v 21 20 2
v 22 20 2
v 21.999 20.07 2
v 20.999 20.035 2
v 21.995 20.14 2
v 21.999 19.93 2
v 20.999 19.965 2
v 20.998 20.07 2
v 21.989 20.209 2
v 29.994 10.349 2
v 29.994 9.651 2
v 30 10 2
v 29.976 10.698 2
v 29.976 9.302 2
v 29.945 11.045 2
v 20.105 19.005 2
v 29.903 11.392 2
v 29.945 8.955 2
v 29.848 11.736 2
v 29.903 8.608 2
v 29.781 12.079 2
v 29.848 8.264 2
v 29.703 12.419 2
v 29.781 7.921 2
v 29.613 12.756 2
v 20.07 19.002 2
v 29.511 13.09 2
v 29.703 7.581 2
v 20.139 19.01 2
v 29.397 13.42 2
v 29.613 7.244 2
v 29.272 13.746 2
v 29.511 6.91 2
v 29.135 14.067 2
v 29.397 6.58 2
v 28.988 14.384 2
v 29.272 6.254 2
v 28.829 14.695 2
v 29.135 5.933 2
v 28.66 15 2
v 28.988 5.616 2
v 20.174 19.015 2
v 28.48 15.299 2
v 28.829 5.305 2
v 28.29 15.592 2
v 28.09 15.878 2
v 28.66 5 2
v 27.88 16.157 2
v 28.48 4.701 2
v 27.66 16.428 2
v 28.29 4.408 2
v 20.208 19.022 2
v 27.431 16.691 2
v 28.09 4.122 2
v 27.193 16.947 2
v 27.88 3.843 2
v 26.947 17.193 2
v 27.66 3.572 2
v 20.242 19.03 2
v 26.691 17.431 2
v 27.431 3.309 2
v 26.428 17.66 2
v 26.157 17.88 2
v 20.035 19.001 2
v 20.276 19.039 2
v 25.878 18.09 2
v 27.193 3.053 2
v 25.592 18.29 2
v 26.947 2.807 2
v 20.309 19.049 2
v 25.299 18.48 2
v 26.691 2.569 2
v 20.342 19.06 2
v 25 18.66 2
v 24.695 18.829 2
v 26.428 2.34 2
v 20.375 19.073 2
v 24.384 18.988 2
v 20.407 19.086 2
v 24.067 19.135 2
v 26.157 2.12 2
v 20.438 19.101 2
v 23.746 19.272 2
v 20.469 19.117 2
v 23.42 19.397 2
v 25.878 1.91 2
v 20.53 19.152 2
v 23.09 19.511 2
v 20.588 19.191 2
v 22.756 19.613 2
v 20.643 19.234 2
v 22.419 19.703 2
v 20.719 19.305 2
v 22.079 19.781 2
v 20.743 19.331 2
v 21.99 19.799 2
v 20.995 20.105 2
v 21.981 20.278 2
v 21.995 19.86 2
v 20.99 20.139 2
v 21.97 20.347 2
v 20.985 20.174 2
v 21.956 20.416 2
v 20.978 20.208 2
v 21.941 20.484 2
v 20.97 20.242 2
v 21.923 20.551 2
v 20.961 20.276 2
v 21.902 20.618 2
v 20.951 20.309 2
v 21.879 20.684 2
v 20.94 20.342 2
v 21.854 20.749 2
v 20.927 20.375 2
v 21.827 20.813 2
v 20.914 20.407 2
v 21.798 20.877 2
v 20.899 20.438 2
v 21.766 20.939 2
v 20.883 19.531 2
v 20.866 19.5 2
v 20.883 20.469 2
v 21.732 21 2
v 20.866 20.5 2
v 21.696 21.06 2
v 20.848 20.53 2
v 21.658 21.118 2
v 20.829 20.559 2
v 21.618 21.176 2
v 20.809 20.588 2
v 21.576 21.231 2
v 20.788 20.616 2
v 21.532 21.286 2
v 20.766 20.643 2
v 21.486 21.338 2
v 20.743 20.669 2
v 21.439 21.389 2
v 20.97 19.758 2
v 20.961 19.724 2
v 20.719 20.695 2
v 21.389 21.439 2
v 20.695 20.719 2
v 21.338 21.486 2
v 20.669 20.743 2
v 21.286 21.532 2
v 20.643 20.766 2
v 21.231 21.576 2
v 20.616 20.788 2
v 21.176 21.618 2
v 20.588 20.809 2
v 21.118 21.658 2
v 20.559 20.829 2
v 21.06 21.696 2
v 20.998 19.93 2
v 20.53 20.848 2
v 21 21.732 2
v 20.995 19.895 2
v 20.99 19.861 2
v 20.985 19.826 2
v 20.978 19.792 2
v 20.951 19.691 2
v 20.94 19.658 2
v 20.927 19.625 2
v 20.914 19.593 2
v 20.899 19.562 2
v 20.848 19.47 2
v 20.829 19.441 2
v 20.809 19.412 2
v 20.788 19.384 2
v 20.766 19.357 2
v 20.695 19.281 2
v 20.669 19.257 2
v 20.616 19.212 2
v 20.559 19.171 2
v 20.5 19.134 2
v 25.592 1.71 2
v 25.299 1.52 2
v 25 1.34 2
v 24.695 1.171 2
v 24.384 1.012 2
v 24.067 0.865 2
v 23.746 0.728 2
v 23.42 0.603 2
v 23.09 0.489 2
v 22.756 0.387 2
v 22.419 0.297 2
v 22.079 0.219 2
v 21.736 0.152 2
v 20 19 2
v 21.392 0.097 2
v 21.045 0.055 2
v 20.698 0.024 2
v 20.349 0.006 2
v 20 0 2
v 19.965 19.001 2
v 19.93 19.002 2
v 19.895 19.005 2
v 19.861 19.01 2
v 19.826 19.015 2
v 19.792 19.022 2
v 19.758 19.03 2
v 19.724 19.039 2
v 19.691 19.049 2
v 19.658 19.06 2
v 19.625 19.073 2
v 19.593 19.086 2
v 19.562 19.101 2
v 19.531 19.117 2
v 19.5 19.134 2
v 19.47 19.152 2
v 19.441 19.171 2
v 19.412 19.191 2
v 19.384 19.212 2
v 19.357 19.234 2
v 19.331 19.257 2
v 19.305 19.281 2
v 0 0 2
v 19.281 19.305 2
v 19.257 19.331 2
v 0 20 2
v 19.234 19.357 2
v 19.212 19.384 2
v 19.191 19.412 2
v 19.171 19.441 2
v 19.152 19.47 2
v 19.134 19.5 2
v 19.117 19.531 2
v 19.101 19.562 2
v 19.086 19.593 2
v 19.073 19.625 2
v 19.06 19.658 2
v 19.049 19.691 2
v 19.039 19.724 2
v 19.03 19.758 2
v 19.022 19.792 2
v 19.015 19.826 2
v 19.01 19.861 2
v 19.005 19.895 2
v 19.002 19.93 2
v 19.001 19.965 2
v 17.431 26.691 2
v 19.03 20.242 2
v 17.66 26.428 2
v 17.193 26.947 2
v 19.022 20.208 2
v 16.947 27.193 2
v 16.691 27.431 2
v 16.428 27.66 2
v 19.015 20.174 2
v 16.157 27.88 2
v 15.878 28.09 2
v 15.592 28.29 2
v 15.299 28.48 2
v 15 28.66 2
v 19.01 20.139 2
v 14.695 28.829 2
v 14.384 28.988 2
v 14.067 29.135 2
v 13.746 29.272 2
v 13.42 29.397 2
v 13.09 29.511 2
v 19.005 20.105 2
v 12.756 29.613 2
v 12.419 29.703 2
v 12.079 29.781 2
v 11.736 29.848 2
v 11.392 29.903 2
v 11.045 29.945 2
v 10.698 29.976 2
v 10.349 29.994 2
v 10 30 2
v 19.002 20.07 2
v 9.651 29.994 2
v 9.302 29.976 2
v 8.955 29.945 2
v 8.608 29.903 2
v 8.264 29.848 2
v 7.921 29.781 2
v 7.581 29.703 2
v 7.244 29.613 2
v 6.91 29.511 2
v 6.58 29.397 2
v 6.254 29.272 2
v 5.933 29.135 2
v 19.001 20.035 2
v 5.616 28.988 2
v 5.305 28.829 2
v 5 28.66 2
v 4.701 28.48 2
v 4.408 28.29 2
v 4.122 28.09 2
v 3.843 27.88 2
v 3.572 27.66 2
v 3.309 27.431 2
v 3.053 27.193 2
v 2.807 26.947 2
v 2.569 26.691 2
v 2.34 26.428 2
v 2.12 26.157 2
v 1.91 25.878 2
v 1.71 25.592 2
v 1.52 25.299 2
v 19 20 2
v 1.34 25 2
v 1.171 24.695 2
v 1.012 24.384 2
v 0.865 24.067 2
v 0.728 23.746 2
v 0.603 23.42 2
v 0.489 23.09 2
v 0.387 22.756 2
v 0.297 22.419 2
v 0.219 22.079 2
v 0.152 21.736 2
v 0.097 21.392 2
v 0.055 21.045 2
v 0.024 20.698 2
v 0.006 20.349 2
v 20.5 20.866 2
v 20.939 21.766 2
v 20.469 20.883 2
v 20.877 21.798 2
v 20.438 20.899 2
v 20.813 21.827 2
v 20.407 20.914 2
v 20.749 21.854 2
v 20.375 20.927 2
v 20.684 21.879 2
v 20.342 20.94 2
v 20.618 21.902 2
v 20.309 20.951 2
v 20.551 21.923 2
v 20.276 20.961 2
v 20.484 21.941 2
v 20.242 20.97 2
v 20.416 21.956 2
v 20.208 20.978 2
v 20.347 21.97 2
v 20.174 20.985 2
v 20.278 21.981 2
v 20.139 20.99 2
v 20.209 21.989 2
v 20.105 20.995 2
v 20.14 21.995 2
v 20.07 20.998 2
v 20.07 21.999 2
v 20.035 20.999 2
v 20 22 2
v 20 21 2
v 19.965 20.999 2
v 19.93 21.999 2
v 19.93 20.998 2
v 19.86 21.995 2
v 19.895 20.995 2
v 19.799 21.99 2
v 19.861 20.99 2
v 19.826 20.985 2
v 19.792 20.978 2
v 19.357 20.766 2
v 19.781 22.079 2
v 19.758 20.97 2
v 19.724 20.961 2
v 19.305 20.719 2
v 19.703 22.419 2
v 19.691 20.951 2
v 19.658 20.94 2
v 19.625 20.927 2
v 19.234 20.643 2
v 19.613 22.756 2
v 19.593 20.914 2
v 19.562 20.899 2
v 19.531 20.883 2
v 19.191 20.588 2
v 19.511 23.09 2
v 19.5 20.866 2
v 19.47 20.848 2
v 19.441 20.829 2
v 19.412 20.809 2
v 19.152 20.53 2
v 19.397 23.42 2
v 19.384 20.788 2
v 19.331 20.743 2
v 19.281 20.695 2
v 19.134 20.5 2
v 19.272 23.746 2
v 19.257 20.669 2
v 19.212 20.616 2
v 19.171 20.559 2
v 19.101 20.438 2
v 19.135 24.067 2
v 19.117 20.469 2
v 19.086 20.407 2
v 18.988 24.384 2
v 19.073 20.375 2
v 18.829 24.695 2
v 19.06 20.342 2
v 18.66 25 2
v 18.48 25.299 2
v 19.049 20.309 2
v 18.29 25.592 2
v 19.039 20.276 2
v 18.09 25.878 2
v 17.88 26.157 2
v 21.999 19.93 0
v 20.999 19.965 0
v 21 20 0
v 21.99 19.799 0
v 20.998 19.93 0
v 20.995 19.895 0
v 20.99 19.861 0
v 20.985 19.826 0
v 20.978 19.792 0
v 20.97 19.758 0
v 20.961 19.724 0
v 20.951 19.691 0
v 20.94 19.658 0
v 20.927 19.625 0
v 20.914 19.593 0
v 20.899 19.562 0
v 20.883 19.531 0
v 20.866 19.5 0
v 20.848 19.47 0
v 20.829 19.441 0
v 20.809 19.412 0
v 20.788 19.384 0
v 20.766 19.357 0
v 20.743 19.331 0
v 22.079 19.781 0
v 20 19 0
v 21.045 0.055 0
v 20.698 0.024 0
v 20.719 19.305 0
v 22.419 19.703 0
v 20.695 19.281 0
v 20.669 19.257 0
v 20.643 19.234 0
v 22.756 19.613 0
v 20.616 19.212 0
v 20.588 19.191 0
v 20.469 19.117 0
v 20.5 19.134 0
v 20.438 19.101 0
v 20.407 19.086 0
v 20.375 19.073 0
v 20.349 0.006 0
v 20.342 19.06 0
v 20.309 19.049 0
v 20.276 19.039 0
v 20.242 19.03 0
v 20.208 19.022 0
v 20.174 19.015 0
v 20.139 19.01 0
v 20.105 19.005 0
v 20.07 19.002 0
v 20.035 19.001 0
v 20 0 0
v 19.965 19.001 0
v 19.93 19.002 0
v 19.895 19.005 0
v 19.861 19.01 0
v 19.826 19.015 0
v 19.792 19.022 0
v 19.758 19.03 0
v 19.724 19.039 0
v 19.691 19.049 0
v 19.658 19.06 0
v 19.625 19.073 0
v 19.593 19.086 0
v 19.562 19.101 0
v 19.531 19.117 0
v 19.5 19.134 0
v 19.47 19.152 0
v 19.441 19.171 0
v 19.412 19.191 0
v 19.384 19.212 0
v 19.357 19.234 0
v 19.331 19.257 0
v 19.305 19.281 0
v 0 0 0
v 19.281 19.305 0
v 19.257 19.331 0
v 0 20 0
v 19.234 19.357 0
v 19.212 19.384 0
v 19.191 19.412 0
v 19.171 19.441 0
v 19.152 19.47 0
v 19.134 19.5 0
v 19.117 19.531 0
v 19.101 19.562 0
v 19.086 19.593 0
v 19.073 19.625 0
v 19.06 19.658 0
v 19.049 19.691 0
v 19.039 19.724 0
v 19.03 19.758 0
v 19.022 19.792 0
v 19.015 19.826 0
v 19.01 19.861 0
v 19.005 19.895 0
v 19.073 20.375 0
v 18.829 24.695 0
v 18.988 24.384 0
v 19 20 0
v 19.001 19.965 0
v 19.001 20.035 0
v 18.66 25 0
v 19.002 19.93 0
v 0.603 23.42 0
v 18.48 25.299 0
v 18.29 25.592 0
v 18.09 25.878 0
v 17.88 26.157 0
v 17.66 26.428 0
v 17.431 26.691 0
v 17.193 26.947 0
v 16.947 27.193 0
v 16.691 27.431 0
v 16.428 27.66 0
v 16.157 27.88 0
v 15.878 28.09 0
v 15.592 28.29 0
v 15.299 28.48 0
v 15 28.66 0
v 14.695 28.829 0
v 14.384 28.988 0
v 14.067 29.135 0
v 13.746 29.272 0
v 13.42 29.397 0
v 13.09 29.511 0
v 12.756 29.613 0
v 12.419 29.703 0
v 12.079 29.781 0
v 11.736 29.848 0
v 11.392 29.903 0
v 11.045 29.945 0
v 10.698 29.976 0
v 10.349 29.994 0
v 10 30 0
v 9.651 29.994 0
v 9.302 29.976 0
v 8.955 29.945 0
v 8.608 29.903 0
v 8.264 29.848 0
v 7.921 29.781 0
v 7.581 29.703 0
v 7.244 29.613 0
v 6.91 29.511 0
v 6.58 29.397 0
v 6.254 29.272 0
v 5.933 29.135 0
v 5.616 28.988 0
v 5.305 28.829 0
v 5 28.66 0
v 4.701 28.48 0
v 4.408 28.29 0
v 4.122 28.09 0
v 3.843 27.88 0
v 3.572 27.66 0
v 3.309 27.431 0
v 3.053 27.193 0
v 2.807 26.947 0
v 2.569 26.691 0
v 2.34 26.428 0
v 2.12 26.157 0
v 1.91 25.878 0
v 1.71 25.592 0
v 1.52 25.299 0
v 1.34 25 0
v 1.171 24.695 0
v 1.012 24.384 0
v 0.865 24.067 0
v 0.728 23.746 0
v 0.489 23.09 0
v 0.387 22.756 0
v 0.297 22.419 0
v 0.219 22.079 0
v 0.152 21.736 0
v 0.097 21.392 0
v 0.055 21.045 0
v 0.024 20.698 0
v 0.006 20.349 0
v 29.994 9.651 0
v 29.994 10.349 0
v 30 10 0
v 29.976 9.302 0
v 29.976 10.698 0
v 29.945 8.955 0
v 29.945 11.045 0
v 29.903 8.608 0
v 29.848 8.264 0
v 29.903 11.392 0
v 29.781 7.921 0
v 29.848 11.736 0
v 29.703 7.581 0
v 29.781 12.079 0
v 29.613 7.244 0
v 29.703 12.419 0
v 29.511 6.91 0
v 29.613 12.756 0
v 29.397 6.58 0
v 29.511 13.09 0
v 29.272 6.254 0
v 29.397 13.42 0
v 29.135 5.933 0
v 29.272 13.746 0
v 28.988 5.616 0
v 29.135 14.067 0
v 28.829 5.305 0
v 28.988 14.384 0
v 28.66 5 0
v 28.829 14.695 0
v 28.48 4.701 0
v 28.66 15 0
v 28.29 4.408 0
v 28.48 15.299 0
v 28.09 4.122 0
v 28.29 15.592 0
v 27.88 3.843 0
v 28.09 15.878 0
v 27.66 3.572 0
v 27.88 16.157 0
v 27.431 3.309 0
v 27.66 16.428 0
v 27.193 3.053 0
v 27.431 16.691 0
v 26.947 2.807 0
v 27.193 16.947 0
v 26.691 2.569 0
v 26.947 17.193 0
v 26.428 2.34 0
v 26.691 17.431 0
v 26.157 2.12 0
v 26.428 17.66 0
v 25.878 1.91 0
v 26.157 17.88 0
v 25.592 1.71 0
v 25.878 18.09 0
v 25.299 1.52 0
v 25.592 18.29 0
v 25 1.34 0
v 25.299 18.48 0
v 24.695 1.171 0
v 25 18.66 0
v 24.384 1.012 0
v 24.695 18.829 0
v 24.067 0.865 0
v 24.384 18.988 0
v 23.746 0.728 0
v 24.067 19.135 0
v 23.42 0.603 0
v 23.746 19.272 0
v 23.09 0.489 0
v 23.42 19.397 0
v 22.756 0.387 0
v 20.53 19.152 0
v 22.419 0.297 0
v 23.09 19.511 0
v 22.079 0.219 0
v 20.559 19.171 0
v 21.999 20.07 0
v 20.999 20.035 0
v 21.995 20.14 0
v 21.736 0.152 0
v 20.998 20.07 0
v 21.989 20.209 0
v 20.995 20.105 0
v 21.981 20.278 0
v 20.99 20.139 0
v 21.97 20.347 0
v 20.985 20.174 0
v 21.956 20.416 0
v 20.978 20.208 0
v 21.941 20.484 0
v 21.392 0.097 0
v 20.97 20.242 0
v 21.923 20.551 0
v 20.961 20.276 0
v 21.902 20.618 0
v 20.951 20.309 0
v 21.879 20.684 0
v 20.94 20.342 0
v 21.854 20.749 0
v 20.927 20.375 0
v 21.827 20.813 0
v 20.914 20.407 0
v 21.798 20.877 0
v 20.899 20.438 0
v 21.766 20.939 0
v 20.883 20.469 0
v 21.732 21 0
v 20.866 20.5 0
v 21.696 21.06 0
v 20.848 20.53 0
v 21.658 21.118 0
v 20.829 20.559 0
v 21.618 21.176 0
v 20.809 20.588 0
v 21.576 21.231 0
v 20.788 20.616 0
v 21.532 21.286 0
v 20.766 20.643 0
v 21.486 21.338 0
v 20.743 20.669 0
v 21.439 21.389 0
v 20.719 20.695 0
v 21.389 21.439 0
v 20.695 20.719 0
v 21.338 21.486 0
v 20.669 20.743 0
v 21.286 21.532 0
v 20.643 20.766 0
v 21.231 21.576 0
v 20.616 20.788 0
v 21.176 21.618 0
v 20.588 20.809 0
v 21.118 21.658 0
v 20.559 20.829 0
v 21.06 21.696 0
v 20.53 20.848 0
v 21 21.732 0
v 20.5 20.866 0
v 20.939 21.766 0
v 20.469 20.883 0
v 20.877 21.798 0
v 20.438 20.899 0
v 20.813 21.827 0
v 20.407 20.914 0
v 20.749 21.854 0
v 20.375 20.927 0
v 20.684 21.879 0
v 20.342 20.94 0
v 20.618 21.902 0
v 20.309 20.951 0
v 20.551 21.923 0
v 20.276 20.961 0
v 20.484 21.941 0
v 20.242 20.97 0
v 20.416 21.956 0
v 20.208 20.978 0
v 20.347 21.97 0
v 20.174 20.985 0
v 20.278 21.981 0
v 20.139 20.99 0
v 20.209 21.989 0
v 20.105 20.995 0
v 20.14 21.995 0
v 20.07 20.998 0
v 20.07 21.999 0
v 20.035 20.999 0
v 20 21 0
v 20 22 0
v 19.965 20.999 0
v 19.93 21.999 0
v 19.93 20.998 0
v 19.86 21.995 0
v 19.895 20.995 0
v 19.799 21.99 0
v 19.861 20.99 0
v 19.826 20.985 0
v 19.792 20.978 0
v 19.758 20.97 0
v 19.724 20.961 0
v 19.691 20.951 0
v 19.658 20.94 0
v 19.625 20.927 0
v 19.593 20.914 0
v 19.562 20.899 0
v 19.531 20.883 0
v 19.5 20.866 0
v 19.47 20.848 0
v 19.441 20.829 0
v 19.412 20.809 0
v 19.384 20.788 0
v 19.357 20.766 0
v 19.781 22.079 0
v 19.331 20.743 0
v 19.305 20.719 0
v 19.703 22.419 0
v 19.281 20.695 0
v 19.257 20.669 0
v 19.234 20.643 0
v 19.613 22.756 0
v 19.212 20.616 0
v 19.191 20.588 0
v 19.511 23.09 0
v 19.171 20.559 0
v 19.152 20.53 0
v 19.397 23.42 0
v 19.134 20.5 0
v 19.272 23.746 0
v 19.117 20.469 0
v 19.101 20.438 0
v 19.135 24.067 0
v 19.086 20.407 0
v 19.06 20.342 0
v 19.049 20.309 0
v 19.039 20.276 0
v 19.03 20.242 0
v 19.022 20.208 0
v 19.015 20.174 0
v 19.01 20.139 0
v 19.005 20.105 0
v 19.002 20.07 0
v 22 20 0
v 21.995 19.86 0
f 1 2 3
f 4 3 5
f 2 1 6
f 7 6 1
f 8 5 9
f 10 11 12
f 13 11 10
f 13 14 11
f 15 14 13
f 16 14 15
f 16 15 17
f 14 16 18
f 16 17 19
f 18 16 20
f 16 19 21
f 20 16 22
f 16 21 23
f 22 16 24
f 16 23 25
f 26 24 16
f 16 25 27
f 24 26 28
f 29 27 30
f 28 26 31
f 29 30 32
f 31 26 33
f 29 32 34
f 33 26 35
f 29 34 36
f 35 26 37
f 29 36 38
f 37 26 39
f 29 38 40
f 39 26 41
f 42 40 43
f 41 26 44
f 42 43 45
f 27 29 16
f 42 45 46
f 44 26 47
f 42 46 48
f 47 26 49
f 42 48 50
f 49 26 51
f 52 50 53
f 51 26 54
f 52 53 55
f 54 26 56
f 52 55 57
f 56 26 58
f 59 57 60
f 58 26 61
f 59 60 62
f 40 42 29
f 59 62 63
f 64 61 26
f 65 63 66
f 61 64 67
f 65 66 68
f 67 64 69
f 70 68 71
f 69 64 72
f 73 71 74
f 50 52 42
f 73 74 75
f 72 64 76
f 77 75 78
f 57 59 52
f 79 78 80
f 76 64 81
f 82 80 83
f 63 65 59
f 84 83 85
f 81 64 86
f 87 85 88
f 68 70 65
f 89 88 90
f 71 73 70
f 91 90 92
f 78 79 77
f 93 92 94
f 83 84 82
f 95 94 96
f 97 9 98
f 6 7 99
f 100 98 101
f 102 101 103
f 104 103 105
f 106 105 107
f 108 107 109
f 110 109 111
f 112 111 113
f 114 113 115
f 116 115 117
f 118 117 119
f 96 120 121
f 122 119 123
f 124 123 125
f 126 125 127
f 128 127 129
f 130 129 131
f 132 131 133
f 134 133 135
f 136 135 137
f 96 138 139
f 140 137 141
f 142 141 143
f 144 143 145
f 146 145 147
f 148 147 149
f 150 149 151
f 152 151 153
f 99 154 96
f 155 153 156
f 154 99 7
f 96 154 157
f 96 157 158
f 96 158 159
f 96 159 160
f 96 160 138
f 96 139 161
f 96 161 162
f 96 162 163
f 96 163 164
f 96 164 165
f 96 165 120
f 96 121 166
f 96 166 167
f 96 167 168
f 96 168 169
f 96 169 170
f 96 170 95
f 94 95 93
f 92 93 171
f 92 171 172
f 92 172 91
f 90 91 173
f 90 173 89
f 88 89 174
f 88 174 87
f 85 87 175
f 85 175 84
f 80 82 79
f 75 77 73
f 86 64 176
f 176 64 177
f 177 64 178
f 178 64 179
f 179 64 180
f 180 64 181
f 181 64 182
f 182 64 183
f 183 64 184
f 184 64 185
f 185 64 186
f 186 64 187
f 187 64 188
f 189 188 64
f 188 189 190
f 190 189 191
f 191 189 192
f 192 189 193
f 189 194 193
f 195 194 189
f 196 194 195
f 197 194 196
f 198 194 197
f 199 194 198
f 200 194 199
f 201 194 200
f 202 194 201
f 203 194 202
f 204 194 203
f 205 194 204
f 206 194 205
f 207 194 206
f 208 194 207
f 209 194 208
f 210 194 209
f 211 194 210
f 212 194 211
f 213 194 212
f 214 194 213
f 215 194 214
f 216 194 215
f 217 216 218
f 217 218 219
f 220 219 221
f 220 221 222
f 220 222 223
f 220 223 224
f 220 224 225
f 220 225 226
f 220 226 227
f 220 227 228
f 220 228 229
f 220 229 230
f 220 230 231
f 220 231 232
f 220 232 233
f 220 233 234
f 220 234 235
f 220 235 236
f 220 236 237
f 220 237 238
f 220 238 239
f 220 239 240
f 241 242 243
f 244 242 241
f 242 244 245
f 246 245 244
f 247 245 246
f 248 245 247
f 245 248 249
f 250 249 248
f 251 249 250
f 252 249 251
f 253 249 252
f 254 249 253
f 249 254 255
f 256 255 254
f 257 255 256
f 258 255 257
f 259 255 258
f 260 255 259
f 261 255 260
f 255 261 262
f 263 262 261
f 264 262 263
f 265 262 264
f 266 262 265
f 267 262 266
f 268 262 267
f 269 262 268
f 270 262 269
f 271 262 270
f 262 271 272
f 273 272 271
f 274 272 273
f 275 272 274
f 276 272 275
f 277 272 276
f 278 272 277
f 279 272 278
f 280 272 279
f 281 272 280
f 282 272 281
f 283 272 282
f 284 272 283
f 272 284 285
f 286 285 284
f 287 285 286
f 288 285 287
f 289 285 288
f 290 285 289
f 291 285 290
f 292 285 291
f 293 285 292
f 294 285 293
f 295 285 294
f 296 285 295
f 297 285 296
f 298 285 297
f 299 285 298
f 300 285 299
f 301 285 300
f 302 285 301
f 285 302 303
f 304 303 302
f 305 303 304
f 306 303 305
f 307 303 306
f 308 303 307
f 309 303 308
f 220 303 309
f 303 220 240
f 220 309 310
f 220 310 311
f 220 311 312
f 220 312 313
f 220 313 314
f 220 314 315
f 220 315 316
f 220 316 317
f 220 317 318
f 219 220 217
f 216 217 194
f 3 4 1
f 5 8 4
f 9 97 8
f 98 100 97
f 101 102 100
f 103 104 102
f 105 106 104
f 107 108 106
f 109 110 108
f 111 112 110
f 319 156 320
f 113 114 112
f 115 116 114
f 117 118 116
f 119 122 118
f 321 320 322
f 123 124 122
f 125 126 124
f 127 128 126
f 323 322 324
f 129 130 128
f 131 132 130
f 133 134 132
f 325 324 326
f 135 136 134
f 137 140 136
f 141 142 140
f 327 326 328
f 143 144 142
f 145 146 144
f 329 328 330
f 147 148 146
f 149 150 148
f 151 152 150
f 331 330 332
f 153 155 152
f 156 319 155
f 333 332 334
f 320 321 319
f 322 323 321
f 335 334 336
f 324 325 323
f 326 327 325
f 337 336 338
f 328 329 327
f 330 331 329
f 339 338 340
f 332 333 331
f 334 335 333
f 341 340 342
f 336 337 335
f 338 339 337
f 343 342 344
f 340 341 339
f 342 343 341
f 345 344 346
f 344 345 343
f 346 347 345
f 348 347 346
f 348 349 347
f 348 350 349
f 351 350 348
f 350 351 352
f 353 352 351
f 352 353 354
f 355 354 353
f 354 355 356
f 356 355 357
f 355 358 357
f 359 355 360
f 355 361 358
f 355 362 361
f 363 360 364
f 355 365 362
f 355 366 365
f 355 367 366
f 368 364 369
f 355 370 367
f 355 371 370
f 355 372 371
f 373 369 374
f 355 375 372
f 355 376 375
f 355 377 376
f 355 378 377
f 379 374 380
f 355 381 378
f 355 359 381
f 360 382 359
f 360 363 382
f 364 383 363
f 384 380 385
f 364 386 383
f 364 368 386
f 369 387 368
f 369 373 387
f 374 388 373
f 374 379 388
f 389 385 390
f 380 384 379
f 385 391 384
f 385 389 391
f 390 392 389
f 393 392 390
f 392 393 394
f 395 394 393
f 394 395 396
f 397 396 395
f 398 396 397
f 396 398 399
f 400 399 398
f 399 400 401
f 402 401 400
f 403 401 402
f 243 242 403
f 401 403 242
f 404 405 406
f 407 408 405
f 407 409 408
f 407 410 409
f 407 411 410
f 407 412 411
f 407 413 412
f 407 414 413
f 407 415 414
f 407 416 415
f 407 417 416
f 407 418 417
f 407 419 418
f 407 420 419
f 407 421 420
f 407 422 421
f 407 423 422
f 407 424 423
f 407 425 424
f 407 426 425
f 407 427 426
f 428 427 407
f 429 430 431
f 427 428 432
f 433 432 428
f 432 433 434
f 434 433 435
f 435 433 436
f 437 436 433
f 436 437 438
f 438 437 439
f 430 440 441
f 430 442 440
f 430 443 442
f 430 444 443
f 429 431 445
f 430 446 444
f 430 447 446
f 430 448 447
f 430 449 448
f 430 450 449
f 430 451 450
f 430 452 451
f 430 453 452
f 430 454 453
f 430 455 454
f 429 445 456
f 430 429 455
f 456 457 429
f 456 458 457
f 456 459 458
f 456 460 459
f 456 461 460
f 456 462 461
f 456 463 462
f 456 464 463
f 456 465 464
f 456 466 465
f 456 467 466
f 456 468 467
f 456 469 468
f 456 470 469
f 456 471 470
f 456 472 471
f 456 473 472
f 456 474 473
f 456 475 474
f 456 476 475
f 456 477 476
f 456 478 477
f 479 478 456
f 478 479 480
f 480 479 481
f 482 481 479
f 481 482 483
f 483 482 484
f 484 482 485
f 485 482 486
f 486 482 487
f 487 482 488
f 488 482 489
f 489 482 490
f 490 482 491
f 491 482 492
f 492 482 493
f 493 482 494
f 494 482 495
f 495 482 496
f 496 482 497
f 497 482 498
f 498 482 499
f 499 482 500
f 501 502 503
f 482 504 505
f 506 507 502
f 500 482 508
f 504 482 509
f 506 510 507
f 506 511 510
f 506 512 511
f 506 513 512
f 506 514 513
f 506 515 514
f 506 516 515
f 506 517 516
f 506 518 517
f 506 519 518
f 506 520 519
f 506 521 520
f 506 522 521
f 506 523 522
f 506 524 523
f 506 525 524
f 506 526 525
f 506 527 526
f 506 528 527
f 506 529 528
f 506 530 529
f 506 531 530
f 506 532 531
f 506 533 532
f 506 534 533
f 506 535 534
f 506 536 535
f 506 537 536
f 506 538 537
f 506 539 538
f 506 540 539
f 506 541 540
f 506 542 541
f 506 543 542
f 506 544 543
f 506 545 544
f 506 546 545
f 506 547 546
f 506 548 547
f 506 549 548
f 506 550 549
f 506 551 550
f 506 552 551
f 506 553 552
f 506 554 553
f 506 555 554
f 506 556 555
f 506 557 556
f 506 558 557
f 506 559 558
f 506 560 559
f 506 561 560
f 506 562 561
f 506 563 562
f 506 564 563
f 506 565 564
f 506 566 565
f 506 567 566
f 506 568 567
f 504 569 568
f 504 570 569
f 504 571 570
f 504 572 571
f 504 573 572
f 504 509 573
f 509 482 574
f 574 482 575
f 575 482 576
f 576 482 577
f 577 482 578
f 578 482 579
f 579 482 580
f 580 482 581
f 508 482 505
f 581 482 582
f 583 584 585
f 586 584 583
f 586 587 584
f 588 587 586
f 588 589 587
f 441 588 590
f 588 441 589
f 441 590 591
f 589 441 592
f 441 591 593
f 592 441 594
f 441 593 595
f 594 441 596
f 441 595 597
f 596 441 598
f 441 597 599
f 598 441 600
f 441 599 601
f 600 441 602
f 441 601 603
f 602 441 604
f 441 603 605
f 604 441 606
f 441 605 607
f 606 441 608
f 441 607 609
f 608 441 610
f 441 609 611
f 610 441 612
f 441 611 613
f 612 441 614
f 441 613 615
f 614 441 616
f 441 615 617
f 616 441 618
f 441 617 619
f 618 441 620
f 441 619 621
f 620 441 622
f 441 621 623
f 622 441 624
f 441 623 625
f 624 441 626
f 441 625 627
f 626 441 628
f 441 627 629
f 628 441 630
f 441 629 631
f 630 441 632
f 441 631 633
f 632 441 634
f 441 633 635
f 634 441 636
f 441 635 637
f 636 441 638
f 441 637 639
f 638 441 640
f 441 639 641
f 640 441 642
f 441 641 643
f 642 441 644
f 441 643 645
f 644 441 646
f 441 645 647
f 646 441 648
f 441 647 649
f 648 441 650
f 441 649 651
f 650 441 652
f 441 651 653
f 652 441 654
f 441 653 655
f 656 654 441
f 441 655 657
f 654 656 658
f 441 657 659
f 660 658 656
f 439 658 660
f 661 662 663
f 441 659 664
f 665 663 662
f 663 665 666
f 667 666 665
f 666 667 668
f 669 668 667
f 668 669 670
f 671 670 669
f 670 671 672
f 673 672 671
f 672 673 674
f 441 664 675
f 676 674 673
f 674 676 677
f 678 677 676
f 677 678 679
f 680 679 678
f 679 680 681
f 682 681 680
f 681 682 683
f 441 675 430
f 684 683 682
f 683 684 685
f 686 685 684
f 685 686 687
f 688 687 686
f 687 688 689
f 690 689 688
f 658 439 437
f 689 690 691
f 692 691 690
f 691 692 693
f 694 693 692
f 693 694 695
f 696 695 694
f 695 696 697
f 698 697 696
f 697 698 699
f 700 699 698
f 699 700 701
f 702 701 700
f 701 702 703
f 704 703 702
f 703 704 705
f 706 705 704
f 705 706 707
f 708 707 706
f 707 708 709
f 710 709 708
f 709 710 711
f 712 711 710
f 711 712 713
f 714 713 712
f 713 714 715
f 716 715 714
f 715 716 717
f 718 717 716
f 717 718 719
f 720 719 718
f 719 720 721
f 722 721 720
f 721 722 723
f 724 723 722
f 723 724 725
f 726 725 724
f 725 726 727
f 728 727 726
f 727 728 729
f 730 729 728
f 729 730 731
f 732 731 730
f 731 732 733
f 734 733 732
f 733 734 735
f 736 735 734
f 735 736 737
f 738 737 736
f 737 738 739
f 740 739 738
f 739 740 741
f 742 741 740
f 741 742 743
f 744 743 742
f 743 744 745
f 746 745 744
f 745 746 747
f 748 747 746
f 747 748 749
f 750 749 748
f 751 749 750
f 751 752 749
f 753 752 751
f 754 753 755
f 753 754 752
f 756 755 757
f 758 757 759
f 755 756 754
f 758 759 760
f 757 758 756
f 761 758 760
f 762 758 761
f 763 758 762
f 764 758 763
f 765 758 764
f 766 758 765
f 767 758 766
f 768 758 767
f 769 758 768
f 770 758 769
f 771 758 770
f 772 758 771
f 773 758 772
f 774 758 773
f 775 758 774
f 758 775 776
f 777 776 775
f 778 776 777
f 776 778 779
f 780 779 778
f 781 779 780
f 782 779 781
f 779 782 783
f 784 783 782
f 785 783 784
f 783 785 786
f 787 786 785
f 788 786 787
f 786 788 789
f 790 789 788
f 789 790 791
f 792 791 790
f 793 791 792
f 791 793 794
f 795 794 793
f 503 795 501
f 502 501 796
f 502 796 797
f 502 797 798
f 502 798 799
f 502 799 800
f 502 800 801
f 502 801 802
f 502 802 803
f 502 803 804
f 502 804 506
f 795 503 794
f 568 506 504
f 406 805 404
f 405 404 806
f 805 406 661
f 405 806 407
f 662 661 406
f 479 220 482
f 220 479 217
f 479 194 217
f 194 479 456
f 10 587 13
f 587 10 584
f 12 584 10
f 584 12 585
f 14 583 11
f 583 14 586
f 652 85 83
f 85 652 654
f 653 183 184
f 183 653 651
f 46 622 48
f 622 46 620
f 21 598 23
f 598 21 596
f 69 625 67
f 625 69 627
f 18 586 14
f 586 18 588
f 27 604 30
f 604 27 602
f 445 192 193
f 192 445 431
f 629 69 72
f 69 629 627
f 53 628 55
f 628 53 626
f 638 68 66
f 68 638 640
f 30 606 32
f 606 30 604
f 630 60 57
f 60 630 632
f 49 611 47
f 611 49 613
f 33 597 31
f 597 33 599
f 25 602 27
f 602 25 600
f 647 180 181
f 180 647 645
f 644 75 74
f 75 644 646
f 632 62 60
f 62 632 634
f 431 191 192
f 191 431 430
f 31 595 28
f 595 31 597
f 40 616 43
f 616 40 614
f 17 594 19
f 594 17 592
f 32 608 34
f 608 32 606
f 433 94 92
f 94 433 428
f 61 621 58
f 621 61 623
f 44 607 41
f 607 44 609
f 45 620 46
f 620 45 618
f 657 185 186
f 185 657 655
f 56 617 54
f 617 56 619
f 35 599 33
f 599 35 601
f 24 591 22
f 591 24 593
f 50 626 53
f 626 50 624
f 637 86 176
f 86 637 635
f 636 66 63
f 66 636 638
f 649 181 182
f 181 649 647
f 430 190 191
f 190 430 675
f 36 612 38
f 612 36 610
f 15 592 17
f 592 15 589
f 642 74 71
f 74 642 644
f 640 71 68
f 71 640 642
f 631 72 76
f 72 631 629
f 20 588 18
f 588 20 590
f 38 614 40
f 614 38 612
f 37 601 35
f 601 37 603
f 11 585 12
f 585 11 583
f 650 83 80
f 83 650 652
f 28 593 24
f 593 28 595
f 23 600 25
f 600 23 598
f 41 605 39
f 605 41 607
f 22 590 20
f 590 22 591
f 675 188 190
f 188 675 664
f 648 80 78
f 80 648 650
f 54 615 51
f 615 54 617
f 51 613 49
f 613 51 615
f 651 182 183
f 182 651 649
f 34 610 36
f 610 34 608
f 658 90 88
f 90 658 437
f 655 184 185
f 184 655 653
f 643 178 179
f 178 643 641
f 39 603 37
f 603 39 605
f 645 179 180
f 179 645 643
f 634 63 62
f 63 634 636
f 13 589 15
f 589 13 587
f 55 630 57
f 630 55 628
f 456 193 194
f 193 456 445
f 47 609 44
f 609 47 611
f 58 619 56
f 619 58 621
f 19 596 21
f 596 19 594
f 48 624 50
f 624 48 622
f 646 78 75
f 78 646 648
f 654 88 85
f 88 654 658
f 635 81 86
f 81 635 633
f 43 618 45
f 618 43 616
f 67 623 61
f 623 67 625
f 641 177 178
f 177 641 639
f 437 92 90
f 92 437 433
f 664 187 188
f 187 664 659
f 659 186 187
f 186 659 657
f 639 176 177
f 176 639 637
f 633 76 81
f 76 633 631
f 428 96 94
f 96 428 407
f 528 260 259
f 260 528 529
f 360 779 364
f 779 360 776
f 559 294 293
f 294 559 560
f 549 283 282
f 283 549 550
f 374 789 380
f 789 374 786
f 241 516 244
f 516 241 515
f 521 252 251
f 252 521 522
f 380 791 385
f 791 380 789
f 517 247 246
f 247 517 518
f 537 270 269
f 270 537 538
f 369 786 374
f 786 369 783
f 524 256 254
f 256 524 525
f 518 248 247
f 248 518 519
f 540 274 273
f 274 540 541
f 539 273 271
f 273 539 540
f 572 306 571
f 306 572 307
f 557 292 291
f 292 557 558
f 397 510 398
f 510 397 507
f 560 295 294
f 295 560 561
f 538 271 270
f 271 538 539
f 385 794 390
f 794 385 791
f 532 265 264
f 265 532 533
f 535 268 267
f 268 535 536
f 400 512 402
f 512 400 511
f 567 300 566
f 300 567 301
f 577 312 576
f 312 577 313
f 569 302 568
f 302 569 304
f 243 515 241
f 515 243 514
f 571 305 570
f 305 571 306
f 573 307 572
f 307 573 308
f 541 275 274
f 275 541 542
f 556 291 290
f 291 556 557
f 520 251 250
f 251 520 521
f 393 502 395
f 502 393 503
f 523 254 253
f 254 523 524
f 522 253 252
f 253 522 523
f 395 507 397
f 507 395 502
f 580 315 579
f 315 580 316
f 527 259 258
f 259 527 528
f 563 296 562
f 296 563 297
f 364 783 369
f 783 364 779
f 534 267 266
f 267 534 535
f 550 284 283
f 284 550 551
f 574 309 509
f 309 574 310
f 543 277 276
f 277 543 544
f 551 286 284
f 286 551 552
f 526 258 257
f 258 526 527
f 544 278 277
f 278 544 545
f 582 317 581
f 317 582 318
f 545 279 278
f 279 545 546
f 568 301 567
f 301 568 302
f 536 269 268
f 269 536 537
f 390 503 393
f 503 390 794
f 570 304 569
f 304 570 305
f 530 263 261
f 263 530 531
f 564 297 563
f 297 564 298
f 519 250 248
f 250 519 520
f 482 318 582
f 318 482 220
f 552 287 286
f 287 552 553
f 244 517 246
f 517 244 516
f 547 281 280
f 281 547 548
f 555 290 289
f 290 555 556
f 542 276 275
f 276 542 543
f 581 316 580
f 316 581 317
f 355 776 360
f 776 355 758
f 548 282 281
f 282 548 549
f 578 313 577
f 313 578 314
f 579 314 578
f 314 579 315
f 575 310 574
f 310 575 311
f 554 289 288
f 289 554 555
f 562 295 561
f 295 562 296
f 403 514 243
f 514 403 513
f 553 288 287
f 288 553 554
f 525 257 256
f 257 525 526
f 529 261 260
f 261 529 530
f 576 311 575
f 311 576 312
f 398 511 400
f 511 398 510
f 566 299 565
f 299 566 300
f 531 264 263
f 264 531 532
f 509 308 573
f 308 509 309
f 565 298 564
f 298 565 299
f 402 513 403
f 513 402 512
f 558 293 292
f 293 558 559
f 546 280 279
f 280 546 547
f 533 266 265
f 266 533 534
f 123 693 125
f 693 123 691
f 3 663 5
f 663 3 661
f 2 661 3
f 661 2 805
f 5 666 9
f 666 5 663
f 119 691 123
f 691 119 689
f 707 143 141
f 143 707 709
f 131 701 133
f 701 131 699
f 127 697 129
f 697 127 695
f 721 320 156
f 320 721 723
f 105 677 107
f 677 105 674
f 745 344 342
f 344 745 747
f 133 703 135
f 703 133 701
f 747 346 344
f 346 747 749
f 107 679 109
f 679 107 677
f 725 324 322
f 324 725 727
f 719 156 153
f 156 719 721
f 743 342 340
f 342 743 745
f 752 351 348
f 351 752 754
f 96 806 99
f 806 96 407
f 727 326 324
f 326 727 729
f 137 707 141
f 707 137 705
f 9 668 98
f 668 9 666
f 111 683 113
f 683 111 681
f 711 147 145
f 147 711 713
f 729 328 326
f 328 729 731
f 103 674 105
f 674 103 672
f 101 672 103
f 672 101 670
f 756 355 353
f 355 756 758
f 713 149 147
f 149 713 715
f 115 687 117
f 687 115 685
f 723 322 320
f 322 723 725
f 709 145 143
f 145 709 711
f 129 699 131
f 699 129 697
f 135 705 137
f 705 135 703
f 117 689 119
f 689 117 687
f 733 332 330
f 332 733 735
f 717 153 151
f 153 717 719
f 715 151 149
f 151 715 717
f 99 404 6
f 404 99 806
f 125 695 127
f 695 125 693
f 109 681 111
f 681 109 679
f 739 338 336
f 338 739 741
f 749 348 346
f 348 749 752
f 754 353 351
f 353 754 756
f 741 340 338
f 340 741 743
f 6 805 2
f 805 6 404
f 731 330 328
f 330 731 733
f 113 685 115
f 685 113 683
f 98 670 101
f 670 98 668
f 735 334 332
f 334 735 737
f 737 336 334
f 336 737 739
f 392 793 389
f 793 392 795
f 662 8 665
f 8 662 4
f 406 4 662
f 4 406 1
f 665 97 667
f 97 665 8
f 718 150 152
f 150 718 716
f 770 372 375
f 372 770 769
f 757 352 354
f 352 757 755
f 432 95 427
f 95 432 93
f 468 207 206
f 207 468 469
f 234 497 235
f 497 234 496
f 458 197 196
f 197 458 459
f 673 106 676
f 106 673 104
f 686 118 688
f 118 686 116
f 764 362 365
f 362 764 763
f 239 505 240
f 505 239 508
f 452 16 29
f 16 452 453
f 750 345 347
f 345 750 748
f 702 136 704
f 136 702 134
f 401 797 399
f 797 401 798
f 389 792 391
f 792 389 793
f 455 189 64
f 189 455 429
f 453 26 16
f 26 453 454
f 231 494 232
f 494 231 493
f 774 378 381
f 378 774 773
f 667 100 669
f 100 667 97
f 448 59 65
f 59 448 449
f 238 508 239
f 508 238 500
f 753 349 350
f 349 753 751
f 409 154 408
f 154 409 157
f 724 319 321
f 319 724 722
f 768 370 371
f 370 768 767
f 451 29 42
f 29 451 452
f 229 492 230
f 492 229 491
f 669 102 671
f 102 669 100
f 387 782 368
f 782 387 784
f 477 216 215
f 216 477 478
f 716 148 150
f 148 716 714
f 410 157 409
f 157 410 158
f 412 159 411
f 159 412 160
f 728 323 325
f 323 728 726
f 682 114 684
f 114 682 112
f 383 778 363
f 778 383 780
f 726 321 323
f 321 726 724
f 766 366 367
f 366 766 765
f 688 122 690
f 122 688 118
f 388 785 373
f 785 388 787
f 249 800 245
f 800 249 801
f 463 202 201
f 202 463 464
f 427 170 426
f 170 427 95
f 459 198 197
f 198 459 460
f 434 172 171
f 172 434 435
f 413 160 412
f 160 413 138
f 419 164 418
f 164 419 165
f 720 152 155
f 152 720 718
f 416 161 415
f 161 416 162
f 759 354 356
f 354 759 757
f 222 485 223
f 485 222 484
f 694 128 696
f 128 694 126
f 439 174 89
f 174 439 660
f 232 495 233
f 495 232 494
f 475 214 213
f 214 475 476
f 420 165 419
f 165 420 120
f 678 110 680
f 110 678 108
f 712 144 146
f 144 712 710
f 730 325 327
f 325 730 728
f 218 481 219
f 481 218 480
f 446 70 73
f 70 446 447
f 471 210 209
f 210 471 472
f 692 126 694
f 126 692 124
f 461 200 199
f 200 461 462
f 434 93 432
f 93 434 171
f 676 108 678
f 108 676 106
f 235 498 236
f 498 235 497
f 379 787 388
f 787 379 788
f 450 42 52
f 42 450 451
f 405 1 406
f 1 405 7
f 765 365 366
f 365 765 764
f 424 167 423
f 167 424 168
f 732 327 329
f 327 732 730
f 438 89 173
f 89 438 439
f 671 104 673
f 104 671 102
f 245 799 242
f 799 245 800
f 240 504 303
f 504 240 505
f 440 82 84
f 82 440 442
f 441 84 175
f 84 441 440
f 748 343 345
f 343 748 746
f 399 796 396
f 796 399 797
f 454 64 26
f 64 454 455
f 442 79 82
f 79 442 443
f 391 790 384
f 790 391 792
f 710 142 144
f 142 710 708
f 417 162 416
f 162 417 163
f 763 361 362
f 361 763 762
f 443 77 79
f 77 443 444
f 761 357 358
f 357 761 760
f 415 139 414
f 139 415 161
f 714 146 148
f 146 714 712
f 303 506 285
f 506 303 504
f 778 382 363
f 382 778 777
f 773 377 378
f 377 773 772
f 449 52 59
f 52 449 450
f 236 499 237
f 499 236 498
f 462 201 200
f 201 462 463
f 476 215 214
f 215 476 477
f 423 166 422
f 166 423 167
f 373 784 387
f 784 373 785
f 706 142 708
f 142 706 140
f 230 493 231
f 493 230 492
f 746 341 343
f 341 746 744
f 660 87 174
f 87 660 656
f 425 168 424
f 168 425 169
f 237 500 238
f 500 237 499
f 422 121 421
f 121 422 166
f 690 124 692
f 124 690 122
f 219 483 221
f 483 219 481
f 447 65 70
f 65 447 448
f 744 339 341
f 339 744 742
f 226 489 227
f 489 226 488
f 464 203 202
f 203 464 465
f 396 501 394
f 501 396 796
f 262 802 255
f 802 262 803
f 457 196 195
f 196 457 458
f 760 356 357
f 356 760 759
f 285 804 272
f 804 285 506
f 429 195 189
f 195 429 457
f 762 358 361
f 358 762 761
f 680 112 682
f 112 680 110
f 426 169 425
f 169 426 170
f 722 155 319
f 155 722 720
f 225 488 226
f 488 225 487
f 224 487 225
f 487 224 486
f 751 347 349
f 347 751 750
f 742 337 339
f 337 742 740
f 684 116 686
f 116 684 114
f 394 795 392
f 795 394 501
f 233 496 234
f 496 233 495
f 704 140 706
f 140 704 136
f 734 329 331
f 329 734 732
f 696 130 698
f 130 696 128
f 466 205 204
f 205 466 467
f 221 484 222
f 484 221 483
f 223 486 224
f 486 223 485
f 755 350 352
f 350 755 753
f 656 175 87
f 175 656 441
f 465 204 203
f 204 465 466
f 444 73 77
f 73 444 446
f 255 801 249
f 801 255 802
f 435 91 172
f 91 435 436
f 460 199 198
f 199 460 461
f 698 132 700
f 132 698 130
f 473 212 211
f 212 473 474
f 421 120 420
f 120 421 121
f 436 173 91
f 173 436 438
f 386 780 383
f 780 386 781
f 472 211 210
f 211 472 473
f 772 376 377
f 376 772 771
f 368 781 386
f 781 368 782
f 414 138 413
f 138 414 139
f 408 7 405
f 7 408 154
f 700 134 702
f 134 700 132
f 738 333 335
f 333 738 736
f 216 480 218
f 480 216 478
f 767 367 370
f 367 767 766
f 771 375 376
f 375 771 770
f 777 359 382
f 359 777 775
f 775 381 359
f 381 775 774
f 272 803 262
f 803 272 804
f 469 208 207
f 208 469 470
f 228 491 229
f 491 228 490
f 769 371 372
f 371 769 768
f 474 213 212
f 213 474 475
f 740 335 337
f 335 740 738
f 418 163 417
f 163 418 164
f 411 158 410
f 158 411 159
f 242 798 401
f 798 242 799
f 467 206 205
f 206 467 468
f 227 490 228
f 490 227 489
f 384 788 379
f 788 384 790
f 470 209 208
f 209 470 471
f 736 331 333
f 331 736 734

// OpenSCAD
// file: hearth.scad
module heart(h=2,a=20,t=1,s1=1,s2=1)
{
    cube([a,a,h]);
    translate([a,t*(a/2),0]) scale([s1,s2,1]) cylinder(h=h,d=a);
    translate([t*(a/2),a,0]) scale([s2,s1,1]) cylinder(h=h,d=a);
}
// file: hearth-earrings.scad
use<hearth.scad>

module hole(r=1,R=2)
{
    difference()
    {
        cylinder(r=R,h=2);
        translate([0,0,-1]) cylinder(r=r,h=4);
    }
    
}

module ear_ring(a = 20)
{
    difference()
    {
        heart(a=a);
        translate([a,a,-1]) cylinder(r=1,h=4);
        //#translate([-a,-a,-1]) cylinder(r=a/1.5,h=4);
    }
    
    translate([a,a,0]) hole();
}

module adv_ear_ring(a=15)
{
    eps = 0.01;
    eps_2 = eps/2;

    difference()
    {
        heart(a=a,t=0.9,s1=0.9,s2=0.9);
        translate([1,1,-eps_2]) heart(a=a-2,s1=1,s2=0.9,t=0.9,h=2+eps);
        translate([a,a,-1]) cylinder(r=1,h=4);
        //#translate([-a,-a,-1]) cylinder(r=a/1.5,h=4);
    }
    
    translate([a,a,0]) hole();
    
    translate([a-2.25,a-2.25,0])cube([1.5,1.5,2]);
    
    
    c_h = sqrt(a*a+a*a)-2;
    
    translate([2,2,0])
    difference(){
        m_a = a-4;
        m_a_m = m_a - 2;
        //m_am = 
        heart(a=m_a,t=0.9,s1=1.1,s2=0.9);
        translate([0.9*(m_a)+eps_2,0.9*(m_a)+eps_2,-eps_2])
            cube([0.1*(m_a)+eps,0.1*(m_a)+eps,2+eps]);
        translate([1,1,-eps_2])
            heart(a=m_a_m,t=0.9,s1=1.1,s2=0.9,h=2+eps);
    }
    rotate([0,-90,-135]) translate([1,0,0.5]) cylinder(r=0.5,h=c_h);

}
// file: hearth-toothpick.scad
use<hearth.scad>

module heart_pick(a=14,h=2.5,l=55,t=4)
{
    //%cube([20,20,2]);
    difference()
    {
        heart(a=a,s1=0.9,h=h);
        translate([1.1,1.1,1.75]) heart(a=a-2, s1=1,h=h);
        translate([1.1,1.1,-1.75]) heart(a=a-2,s1=1,h=h);
    }
    
    c=0.65*h;
    
    d=0.3*h;
    
    translate([1.2,1.2,0.5*h])
    rotate([90,0,-45])
    hull()
    {
        #translate([c,0,0]) cylinder(d=0.25,h=l);
        #translate([0,d,0.5]) cylinder(d=0.25,h=l-0.5);
        #translate([-c,0,0]) cylinder(d=0.25,h=l);
        #translate([0,-d,0.5]) cylinder(d=0.25,h=l-0.5);
        translate([0,0,1.1*l]) sphere(d=0.25);
    }
}
// main file
use<hearth-toothpick.scad>
use<hearth-earrings.scad>

$fn = $preview ? 36 : 180;

part_name = "earring"; // ["earring", "advanced-earring", "toothpick"]

if (part_name == "earring")
{
    ear_ring();
}
else if (part_name == "advanced-earring")
{
    adv_ear_ring();
}
else if (part_name == "toothpick")
{
    heart_pick();
}
